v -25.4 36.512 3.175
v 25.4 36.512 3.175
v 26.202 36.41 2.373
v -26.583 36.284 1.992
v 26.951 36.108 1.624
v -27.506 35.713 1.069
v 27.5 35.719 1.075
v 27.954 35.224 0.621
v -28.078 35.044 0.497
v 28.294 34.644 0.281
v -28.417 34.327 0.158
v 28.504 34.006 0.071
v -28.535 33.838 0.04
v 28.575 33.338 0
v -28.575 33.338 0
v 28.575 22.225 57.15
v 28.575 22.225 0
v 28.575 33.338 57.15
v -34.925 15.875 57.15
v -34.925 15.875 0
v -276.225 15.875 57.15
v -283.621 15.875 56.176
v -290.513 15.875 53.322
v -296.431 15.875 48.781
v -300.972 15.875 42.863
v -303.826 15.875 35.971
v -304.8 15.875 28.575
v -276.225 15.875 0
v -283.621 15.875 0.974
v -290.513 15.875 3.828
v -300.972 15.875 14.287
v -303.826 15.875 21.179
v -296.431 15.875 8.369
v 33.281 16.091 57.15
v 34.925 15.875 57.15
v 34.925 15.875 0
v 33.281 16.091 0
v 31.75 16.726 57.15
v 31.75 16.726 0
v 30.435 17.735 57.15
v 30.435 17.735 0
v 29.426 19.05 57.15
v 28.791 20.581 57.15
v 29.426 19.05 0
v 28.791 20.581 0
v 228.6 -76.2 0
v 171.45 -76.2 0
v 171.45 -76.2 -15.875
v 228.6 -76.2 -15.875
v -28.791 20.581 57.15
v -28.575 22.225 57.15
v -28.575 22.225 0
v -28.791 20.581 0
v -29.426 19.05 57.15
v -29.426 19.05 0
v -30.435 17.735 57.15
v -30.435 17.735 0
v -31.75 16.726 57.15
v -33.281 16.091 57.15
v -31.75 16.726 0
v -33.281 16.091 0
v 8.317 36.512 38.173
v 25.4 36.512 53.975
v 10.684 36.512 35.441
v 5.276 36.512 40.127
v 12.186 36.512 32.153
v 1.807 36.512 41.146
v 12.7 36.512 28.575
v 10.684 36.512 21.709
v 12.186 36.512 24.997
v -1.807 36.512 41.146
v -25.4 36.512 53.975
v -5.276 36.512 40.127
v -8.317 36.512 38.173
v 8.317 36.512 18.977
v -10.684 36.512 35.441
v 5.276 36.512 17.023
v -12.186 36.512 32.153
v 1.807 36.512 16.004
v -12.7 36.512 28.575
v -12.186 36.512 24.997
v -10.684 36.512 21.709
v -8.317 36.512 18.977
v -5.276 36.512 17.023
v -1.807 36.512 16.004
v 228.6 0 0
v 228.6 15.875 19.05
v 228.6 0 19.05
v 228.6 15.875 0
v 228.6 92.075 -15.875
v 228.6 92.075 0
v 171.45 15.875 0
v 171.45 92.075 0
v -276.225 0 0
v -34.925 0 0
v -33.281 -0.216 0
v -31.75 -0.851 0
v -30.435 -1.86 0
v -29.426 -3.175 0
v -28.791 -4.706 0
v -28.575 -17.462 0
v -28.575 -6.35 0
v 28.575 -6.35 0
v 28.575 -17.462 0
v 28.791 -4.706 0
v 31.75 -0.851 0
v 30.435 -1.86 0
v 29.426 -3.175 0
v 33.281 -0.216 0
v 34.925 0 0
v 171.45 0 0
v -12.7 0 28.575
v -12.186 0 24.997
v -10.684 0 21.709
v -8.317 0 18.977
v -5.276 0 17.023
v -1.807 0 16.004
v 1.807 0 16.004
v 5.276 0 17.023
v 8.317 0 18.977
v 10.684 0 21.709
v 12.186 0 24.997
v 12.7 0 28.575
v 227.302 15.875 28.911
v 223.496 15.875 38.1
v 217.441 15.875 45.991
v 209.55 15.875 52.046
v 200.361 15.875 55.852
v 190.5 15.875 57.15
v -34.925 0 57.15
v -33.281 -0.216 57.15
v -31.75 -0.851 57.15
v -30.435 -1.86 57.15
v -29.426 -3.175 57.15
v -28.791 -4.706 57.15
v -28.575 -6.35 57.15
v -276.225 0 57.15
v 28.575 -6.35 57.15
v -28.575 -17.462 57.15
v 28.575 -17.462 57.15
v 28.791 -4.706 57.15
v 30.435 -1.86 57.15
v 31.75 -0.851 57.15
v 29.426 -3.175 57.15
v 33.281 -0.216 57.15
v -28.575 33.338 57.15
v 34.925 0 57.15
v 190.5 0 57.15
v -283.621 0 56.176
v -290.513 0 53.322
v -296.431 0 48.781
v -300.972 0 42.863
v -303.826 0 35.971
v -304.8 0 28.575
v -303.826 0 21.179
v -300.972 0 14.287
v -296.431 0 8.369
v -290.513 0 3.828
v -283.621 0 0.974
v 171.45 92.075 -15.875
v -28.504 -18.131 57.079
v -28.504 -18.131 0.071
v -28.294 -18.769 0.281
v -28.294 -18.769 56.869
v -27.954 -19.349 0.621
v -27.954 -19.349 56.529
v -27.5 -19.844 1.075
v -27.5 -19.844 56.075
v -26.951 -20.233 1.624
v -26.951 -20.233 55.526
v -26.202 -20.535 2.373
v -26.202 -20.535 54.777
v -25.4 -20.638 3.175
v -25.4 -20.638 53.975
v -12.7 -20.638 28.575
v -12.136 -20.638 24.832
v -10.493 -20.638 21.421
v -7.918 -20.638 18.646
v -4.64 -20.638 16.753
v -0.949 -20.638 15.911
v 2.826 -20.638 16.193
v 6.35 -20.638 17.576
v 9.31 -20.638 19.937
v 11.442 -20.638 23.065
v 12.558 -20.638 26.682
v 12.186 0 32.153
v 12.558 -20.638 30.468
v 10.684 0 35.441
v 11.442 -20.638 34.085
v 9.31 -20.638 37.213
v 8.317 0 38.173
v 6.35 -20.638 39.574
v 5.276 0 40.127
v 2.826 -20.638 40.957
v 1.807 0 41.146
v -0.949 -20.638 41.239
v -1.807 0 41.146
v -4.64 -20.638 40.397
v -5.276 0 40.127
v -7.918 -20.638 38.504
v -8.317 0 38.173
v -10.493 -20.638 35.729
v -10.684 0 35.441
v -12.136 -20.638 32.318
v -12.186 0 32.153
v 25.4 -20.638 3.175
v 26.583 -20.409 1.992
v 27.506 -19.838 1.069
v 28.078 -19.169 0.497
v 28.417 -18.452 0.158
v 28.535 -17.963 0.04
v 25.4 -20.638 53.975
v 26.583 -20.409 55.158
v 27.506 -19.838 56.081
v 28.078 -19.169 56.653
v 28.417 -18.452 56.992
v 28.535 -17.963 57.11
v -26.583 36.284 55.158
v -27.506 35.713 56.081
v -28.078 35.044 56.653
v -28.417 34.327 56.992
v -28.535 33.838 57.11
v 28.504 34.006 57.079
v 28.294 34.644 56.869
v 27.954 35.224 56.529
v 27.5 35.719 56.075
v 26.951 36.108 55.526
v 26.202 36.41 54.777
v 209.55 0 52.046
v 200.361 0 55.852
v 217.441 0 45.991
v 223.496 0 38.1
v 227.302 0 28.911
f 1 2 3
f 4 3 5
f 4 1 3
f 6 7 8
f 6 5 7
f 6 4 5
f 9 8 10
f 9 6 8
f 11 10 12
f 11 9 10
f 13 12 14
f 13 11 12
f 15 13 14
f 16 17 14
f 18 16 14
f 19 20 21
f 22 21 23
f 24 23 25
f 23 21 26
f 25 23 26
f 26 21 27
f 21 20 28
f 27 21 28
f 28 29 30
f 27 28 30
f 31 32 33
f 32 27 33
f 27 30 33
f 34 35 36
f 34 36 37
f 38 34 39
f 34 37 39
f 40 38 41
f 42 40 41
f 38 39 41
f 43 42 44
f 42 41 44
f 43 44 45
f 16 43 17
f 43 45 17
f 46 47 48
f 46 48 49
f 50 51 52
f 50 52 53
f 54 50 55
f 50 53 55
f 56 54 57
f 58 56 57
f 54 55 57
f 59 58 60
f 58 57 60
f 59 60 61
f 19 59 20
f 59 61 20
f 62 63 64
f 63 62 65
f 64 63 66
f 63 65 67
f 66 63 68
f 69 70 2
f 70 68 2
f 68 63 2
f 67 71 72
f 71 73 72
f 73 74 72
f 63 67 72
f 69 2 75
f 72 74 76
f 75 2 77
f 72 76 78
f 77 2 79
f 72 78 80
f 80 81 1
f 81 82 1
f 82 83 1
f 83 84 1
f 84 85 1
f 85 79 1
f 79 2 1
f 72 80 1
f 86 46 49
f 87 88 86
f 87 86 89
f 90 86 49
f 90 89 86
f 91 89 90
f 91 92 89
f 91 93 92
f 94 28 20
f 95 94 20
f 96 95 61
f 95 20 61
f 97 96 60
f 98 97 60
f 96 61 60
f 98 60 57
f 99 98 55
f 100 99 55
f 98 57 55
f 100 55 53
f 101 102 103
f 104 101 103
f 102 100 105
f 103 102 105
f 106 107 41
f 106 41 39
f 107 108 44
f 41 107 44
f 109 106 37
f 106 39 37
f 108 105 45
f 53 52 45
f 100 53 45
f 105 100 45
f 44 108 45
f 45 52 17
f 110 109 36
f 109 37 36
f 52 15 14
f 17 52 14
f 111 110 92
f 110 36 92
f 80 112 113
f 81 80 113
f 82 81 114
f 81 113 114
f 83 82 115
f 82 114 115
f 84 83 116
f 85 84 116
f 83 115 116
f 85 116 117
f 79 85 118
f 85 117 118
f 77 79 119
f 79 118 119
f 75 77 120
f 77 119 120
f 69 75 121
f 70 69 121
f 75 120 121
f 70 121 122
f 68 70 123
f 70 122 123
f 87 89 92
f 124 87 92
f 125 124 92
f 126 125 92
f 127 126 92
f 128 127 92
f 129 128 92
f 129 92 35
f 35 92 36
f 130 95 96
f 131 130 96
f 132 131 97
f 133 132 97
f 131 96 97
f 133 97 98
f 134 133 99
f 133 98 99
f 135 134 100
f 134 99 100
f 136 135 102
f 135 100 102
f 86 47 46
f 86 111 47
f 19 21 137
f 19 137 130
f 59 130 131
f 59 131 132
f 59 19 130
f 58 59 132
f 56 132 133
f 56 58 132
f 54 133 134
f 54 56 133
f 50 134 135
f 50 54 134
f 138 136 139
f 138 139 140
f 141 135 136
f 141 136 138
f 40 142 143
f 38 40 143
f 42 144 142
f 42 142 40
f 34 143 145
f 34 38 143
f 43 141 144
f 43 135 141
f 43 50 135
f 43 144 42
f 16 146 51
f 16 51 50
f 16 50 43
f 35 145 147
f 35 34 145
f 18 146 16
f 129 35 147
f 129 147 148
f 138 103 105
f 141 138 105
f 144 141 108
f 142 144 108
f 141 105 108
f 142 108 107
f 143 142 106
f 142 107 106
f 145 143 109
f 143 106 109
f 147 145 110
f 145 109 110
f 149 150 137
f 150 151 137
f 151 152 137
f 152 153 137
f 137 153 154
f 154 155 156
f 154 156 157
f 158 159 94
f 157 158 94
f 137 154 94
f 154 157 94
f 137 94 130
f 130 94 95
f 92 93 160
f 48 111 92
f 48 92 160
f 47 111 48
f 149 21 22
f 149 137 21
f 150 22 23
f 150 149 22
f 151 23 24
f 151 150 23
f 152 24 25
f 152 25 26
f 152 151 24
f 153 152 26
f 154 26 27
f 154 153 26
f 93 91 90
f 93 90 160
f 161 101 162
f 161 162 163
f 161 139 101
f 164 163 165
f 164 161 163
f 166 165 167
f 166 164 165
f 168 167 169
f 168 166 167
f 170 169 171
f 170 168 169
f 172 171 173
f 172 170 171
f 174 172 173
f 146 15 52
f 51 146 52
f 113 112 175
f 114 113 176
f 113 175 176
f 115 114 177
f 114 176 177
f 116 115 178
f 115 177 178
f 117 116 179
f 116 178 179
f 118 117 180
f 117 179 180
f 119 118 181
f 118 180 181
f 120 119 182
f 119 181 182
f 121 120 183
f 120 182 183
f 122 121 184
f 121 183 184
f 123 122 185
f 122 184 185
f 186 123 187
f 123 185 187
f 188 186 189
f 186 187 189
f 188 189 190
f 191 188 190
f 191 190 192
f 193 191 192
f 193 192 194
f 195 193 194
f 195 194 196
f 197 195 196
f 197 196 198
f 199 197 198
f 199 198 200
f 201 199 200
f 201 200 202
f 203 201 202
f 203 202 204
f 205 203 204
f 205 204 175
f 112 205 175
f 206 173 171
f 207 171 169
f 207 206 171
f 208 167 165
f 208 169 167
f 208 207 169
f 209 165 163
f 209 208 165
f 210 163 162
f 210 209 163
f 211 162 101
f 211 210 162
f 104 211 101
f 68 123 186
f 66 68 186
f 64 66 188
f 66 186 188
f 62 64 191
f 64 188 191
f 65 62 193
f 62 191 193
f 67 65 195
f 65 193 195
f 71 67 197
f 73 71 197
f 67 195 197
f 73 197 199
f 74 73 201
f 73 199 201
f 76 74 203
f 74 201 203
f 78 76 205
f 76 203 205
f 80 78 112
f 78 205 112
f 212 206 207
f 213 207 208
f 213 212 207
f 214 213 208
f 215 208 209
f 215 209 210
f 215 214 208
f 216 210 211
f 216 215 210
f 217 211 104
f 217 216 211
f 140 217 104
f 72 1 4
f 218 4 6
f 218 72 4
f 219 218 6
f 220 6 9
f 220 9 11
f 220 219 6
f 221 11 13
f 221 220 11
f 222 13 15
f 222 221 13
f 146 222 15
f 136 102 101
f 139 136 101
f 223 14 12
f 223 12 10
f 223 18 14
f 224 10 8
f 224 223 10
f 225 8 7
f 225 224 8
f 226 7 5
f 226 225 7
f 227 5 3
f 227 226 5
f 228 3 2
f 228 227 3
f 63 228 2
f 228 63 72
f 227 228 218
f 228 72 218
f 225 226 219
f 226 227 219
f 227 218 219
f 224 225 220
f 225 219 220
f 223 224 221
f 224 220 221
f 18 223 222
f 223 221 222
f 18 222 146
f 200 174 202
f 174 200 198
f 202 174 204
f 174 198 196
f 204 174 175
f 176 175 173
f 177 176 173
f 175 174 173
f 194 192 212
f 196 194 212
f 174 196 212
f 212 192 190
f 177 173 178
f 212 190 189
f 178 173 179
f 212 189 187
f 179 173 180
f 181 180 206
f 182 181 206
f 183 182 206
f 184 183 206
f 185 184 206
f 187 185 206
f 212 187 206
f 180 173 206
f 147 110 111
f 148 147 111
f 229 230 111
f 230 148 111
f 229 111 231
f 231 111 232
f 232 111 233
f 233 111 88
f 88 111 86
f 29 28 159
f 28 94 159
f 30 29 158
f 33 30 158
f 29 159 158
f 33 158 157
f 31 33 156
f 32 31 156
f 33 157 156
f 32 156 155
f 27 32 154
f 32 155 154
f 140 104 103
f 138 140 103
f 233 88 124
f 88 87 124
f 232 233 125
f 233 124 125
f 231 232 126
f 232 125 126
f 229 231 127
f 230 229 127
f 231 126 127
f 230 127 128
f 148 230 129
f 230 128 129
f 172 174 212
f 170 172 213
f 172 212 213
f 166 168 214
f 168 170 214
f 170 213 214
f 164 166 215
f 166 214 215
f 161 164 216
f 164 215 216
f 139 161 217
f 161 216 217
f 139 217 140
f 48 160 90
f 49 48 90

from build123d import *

# Parameters (mm, degrees)
F1_DEPTH = 57.15
F2_R     = 3.175
F3_R     = 28.57499
F5_D     = 25.4
F5_DEPTH = 38.1
F5_TIP   = 7.6309298617
F6_D     = 25.4
F7_R     = 38.1
F9_DEPTH = 15.875


# Not quite as in the source:
# - a fillet or chamfer is up to 0.001 mm smaller than in the source, because OpenCascade refuses the exact size
# - a length typed as a fraction of an inch, garbled in the dataset ("3 / 203.2 mm" for 3/8 in), is restored


with BuildPart() as f1:
    # F0 (on Top) → F1 (new body)
    with BuildSketch(Plane.XY):
        with BuildLine():
            ThreePointArc((28.575, -6.35), (30.4348719395, -1.8598719395), (34.925, 0))
            Line((34.925, 0), (228.6, 0))
            Line((228.6, 0), (228.6, 15.875))
            Line((228.6, 15.875), (34.925, 15.875))
            ThreePointArc((34.925, 15.875), (30.4348719395, 17.7348719395), (28.575, 22.225))
            Line((28.575, 22.225), (28.575, 36.5125))
            Line((28.575, 36.5125), (0, 36.5125))
            Line((0, 36.5125), (-28.575, 36.5125))
            Line((-28.575, 36.5125), (-28.575, 22.225))
            ThreePointArc((-28.575, 22.225), (-30.4348719395, 17.7348719395), (-34.925, 15.875))
            Line((-34.925, 15.875), (-304.8, 15.875))
            Line((-304.8, 15.875), (-304.8, 0))
            Line((-304.8, 0), (-34.925, 0))
            ThreePointArc((-34.925, 0), (-30.4348719395, -1.8598719395), (-28.575, -6.35))
            Line((-28.575, -6.35), (-28.575, -20.6375))
            Line((-28.575, -20.6375), (0, -20.6375))
            Line((0, -20.6375), (28.575, -20.6375))
            Line((28.575, -20.6375), (28.575, -6.35))
        make_face()
    extrude(amount=F1_DEPTH)

    # F2
    f2_edges = [f1.edges().sort_by_distance(p)[0] for p in [
        (28.575, 36.5125, 28.575),
        (0, 36.5125, 57.15),
        (-28.575, 36.5125, 28.575),
        (0, 36.5125, 0),
        (-28.575, -20.6375, 28.575),
        (0, -20.6375, 57.15),
        (28.575, -20.6375, 28.575),
        (0, -20.6375, 0),
    ]]
    fillet(f2_edges, radius=F2_R)

    # F3 (radius 28.575 in the source; OpenCascade refuses exactly that, so slightly less here)
    f3_edges = [f1.edges().sort_by_distance(p)[0] for p in [
        (-304.8, 7.9375, 57.15),
        (-304.8, 7.9375, 0),
    ]]
    fillet(f3_edges, radius=F3_R)

    # F5 (one way)
    with BuildSketch(Plane.XZ):
        with Locations((0, 28.575)):
            Circle(F5_D / 2)
    extrude(amount=-F5_DEPTH, mode=Mode.SUBTRACT)
    with Locations(Plane.XZ):
        with Locations((0, 28.575)):
            with Locations((0, 0, -(F5_DEPTH + F5_TIP / 2))):  # 118° drill point
                Cone(0, F5_D / 2, F5_TIP, mode=Mode.SUBTRACT)

    # F6 (through all)
    with Locations(Plane(origin=(0, 0, 0), x_dir=(1, 0, 0), z_dir=(0, 1, 0))):
        with Locations((0, -28.575)):
            Hole(F6_D / 2)

    # F7
    f7_edges = [f1.edges().sort_by_distance(p)[0] for p in [
        (228.6, 7.9375, 57.15),
    ]]
    fillet(f7_edges, radius=F7_R)

    # F8 (on Top) → F9 (join)
    with BuildSketch(Plane.XY):
        Polygon((228.6, -76.2), (228.6, 0), (228.6, 92.075), (171.45, 92.075), (171.45, -76.2), align=None)
    extrude(amount=-F9_DEPTH)


solid = f1.part
